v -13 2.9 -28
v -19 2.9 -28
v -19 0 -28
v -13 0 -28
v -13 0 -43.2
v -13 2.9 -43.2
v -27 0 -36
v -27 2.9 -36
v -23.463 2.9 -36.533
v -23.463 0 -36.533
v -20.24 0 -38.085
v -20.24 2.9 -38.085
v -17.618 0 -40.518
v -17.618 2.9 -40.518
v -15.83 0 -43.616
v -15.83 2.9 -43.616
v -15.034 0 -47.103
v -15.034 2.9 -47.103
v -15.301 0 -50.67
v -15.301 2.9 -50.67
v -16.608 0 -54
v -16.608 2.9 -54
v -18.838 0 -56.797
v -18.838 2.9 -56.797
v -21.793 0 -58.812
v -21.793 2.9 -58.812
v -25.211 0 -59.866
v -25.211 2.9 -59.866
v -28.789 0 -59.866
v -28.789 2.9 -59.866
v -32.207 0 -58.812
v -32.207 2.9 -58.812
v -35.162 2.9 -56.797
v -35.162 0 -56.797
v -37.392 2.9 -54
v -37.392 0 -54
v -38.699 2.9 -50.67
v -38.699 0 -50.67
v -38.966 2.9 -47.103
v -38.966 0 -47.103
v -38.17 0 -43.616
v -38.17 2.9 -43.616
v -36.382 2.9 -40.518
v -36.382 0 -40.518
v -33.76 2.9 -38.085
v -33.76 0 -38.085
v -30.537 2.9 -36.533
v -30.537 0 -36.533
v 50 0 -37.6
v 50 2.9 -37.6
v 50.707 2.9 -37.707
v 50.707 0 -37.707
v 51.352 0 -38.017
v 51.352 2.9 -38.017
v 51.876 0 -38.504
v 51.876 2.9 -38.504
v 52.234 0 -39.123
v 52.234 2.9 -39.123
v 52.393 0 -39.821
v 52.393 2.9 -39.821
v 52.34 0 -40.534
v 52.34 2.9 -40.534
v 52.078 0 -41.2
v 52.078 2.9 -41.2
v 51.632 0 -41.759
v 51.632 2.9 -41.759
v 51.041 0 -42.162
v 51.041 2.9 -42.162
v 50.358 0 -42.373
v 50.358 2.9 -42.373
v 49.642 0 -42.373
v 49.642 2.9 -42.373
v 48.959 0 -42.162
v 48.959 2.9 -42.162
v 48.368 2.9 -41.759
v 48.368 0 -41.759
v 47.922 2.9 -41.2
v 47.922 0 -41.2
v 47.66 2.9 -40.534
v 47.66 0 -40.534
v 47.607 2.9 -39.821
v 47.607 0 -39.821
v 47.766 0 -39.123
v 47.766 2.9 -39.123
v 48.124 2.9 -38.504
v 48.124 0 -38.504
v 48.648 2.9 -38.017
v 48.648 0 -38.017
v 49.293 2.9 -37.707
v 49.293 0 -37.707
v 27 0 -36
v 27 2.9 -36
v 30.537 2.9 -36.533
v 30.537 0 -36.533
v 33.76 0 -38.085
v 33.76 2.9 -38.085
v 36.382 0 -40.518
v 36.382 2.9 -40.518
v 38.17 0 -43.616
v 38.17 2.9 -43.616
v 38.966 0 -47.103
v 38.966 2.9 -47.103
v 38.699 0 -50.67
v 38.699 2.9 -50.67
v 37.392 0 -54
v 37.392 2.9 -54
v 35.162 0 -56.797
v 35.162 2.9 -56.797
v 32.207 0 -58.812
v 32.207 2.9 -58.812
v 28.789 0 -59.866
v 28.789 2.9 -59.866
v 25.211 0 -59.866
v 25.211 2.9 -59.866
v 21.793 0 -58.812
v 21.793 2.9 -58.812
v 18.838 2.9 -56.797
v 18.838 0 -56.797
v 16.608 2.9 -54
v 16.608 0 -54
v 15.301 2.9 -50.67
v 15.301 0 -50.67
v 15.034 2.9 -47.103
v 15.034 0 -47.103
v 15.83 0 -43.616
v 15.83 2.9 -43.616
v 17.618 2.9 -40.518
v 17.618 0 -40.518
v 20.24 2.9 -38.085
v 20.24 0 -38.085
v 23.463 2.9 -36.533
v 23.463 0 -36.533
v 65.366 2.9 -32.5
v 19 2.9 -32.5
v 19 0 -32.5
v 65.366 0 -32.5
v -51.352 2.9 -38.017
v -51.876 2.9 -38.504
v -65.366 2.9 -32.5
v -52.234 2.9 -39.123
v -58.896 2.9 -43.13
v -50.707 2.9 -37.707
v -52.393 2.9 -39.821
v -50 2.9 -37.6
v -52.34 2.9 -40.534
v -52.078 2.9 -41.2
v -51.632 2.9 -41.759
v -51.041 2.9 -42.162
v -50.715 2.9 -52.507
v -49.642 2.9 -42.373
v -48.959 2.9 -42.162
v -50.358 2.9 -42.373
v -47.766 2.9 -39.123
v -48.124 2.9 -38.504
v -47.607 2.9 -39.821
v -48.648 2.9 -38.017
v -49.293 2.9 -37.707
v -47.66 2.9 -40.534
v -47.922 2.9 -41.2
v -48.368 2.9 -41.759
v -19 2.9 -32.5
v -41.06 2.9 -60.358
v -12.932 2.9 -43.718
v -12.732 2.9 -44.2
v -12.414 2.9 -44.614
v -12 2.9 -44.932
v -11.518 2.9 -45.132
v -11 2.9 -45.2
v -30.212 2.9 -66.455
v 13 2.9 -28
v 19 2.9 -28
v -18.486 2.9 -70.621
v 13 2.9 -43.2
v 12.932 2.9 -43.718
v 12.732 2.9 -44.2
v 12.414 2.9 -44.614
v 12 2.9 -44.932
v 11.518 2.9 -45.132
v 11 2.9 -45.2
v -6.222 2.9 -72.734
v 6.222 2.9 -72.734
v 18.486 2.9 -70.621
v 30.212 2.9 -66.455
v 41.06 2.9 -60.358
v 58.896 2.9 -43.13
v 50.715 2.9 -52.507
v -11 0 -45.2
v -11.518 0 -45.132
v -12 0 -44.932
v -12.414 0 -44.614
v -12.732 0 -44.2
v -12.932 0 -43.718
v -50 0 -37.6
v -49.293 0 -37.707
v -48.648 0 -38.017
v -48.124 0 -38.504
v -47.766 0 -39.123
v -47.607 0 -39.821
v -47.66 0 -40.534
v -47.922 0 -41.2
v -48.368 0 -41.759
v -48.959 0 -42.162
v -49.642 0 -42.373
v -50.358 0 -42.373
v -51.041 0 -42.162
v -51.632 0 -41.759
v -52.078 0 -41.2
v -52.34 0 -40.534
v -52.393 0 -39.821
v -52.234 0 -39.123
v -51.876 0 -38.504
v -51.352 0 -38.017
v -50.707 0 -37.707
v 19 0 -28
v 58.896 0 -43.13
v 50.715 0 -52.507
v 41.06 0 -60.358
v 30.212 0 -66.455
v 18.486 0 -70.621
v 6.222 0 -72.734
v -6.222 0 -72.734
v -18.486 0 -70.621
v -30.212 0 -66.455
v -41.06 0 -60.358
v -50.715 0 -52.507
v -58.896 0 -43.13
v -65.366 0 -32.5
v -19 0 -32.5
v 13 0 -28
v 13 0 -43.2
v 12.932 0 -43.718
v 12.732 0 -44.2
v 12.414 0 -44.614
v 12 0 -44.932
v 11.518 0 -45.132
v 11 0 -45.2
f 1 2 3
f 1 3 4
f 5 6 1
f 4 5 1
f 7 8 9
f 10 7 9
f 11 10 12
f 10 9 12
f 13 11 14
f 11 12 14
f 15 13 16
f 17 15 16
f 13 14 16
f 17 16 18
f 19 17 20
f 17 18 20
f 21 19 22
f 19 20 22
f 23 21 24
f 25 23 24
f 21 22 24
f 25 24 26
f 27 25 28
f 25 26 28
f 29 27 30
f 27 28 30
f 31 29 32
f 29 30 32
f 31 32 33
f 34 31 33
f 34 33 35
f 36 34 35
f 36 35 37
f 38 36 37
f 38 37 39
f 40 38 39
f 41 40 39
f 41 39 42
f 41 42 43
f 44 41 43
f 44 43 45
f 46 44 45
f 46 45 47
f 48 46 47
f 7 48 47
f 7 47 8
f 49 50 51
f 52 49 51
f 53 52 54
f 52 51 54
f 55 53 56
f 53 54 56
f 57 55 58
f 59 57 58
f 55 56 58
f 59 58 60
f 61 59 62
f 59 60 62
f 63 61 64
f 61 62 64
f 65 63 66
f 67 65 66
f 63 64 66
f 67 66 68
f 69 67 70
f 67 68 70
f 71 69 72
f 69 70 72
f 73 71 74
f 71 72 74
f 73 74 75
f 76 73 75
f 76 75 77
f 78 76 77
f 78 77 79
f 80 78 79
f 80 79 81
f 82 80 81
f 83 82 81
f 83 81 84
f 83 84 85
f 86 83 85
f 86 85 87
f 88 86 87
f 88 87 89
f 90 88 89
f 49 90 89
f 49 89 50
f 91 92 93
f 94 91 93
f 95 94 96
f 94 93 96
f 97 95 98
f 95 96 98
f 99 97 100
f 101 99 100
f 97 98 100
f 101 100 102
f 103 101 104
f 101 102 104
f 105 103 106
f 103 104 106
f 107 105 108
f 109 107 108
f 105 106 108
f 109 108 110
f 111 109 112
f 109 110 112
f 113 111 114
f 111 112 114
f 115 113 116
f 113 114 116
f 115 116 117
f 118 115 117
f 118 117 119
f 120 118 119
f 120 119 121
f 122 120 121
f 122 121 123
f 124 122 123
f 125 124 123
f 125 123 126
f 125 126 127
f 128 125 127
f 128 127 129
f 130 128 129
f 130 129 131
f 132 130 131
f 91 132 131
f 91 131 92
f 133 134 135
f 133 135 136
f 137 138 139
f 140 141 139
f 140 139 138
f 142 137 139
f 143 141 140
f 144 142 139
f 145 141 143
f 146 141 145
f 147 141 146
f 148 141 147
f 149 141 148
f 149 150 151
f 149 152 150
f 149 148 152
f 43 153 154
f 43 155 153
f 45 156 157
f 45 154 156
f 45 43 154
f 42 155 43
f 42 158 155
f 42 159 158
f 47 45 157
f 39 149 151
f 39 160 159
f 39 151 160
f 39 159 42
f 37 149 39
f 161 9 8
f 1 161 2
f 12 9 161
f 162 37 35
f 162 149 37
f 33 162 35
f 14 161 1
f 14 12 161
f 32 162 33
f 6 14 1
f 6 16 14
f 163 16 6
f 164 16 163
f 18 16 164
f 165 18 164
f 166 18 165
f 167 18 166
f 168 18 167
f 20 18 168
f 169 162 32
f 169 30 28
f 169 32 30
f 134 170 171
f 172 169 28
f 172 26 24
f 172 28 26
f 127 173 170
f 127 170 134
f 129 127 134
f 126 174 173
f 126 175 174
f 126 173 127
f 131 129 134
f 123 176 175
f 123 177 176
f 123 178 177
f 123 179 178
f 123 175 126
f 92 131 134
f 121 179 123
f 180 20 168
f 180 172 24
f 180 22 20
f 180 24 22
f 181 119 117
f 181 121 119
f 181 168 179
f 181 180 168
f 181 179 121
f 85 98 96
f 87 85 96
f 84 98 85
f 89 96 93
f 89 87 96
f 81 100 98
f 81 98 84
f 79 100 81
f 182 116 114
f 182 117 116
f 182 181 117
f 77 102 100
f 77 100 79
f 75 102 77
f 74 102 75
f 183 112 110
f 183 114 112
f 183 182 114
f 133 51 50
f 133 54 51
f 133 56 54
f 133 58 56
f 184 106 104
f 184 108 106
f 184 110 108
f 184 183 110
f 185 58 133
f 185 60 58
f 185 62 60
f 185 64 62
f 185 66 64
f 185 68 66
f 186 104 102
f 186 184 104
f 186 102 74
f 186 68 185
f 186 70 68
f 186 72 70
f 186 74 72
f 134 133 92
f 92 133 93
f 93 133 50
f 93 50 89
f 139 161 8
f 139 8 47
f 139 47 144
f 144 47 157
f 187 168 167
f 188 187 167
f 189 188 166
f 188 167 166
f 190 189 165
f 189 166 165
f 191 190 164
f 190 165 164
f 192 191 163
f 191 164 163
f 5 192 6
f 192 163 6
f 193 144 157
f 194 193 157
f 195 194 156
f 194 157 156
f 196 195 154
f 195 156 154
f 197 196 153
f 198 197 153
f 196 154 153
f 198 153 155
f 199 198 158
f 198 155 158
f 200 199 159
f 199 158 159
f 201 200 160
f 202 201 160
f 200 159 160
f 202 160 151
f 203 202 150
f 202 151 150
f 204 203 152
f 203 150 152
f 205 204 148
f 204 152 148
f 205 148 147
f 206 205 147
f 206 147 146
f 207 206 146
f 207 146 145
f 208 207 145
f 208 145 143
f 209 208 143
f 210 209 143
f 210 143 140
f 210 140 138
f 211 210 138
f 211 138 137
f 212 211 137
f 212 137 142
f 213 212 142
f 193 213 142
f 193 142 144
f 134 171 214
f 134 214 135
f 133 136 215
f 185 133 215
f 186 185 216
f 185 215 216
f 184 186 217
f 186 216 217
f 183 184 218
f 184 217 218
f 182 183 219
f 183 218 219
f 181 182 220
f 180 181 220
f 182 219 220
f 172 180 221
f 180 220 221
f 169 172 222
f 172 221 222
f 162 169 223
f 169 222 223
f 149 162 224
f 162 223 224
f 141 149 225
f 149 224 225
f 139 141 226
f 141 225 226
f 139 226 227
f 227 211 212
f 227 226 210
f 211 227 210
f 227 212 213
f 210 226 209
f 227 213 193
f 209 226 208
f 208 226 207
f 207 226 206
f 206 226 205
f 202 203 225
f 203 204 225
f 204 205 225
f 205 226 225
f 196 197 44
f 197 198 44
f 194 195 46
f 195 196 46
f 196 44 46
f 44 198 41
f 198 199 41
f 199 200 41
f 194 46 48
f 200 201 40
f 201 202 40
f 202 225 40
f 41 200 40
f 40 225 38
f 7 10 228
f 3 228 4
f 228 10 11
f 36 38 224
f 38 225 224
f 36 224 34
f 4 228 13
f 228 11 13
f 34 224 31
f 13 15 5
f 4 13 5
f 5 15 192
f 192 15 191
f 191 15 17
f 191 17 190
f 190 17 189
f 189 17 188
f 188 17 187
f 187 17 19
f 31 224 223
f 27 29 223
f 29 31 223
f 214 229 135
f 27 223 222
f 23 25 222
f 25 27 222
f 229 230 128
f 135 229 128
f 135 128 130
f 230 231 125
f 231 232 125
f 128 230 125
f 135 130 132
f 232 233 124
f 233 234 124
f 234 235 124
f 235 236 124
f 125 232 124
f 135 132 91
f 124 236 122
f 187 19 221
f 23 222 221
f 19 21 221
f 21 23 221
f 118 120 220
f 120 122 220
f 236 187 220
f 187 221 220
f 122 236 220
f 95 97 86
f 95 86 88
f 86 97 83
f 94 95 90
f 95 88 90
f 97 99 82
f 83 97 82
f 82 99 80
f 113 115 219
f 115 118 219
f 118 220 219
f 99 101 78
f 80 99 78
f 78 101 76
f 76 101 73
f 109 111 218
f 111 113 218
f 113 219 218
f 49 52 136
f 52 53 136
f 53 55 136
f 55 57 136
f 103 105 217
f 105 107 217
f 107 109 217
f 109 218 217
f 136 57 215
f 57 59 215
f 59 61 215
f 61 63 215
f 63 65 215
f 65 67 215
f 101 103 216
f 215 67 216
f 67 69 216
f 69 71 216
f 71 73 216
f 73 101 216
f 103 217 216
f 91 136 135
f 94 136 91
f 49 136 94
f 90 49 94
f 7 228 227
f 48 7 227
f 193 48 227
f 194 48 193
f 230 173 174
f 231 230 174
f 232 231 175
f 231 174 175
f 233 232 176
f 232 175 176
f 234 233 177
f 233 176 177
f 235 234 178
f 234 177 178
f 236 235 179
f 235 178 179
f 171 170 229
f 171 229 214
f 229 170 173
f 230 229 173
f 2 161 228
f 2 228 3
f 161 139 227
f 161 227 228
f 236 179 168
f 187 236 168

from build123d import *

# Parameters (mm, degrees)
BOSS_EXTRUDE1_DEPTH  = 2.9
SOLENOID_PLACEMENT_W = 38
SOLENOID_PLACEMENT_H = 64
CUT_EXTRUDE1_DEPTH   = 104.278313309
CUT_EXTRUDE4_DEPTH   = 104.278313309
SKETCH5_R            = 12
CUT_EXTRUDE5_DEPTH   = 104.278313309
SKETCH6_R            = 2.4
CUT_EXTRUDE6_DEPTH   = 104.278313309
CUT_EXTRUDE3_DEPTH   = 104.278313309


with BuildPart() as part:
    # Sketch1 → Boss-Extrude1 (new body)
    with BuildSketch(Plane(origin=(0, 0, 0), x_dir=(1, 0, 0), z_dir=(0, 1, 0))):
        with BuildLine():
            ThreePointArc((36.856602833, -63.012624351), (0, 73), (-36.856602833, -63.012624351))
            ThreePointArc((-36.856602833, -63.012624351), (-33.368752207, -63.602994345), (-30.363140064, -61.737536127))
            ThreePointArc((-30.363140064, -61.737536127), (0, -46.75), (30.363140064, -61.737536127))
            ThreePointArc((30.363140064, -61.737536127), (33.368752207, -63.602994345), (36.856602833, -63.012624351))
        make_face()
    extrude(amount=BOSS_EXTRUDE1_DEPTH)

    # solenoid placement → Cut-Extrude1 (cut, through all)
    with BuildSketch(Plane(origin=(0, 2.9, 0), x_dir=(1, 0, 0), z_dir=(0, 1, 0))):
        with Locations((0, -4)):
            Rectangle(SOLENOID_PLACEMENT_W, SOLENOID_PLACEMENT_H)
    extrude(amount=-CUT_EXTRUDE1_DEPTH, mode=Mode.SUBTRACT)

    # Sketch4 → Cut-Extrude4 (cut, through all)
    with BuildSketch(Plane(origin=(0, 2.9, 0), x_dir=(1, 0, 0), z_dir=(0, 1, 0))):
        with BuildLine():
            Line((-13, 28), (13, 28))
            Line((13, 28), (13, 43.2))
            ThreePointArc((13, 43.2), (12.414213562, 44.614213562), (11, 45.2))
            Line((11, 45.2), (-11, 45.2))
            ThreePointArc((-11, 45.2), (-12.414213562, 44.614213562), (-13, 43.2))
            Line((-13, 43.2), (-13, 28))
        make_face()
    extrude(amount=-CUT_EXTRUDE4_DEPTH, mode=Mode.SUBTRACT)

    # Sketch5 → Cut-Extrude5 (cut, through all)
    with BuildSketch(Plane(origin=(0, 2.9, 0), x_dir=(1, 0, 0), z_dir=(0, 1, 0))):
        with Locations(Location((-27, 48, 0), (0, 0, 270))):
            Circle(SKETCH5_R)
        with Locations(Location((27, 48, 0), (0, 0, 270))):
            Circle(SKETCH5_R)
    extrude(amount=-CUT_EXTRUDE5_DEPTH, mode=Mode.SUBTRACT)

    # Sketch6 → Cut-Extrude6 (cut, through all)
    with BuildSketch(Plane(origin=(0, 2.9, 0), x_dir=(1, 0, 0), z_dir=(0, 1, 0))):
        with Locations(Location((40, -40, 0), (0, 0, 270))):
            Circle(SKETCH6_R)
        with Locations(Location((-40, -40, 0), (0, 0, 270))):
            Circle(SKETCH6_R)
        with Locations(Location((-50, 40, 0), (0, 0, 270))):
            Circle(SKETCH6_R)
        with Locations(Location((50, 40, 0), (0, 0, 270))):
            Circle(SKETCH6_R)
    extrude(amount=-CUT_EXTRUDE6_DEPTH, mode=Mode.SUBTRACT)

    # Sketch3 → Cut-Extrude3 (cut, through all)
    with BuildSketch(Plane(origin=(0, 2.9, 0), x_dir=(1, 0, 0), z_dir=(0, 1, 0))):
        Polygon((-19, 28), (19, 28), (19, 32.5), (73, 32.5), (73, -32.5), (-73, -32.5), (-73, 32.5), (-19, 32.5), align=None)
    extrude(amount=-CUT_EXTRUDE3_DEPTH, mode=Mode.SUBTRACT)


with BuildPart() as cut_extrude3_piece_1:
    # of the separate pieces the step leaves, piece 1, a body of its own (cut_extrude3_pieces)
    add(part.part.solids().sort_by_distance((65.366275709, 0, -32.5))[0])


with BuildPart() as cut_extrude3_piece_2:
    # of the separate pieces the step leaves, piece 2, a body of its own (cut_extrude3_pieces)
    add(part.part.solids().sort_by_distance((-36.856602833, 0, 63.012624351))[0])


solid = cut_extrude3_piece_1.part
